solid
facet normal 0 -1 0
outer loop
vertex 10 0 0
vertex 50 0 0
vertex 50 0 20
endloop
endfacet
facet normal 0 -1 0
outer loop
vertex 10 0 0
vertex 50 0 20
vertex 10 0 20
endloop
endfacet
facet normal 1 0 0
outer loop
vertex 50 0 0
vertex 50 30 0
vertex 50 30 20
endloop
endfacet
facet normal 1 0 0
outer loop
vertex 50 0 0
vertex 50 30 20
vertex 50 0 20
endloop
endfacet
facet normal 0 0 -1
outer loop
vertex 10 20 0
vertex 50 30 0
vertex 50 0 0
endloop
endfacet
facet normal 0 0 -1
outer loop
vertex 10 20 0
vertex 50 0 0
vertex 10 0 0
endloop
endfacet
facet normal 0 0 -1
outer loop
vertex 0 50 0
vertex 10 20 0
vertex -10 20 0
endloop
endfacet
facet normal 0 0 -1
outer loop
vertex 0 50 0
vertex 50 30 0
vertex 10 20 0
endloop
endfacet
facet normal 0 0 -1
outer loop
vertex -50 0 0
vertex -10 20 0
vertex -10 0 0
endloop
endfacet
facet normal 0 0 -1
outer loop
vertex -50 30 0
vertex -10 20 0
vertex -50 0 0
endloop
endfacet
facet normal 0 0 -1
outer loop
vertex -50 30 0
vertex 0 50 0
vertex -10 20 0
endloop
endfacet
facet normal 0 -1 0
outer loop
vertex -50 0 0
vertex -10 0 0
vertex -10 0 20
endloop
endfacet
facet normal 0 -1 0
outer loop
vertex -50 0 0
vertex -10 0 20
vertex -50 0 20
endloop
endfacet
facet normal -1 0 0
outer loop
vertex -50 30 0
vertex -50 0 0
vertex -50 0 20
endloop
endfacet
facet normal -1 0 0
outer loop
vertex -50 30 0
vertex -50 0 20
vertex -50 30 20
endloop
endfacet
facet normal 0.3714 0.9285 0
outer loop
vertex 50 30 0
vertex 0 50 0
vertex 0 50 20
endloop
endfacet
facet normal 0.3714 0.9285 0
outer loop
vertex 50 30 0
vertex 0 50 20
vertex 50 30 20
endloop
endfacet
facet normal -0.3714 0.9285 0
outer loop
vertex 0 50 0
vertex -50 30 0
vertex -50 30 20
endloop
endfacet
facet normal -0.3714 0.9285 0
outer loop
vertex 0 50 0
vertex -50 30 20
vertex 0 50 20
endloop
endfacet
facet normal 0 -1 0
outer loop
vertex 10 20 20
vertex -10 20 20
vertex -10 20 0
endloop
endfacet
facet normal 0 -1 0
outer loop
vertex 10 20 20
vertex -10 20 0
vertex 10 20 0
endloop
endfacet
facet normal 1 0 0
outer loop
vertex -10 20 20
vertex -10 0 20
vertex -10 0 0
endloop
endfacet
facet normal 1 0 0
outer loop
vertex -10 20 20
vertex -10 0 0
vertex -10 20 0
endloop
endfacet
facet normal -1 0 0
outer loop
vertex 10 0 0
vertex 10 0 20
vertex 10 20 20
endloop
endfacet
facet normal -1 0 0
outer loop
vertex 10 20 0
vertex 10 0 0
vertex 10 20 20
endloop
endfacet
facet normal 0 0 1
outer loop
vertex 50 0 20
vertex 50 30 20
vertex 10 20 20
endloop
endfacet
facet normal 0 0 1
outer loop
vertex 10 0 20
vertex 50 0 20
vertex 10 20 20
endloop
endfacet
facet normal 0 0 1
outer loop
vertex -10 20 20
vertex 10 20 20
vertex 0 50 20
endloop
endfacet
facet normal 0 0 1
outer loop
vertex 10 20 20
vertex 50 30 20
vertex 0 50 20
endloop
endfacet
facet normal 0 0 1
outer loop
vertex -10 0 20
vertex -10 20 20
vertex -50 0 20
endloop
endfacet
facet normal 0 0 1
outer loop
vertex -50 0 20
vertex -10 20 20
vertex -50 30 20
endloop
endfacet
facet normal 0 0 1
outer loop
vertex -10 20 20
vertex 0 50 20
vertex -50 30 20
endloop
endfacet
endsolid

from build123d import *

# Parameters (mm, degrees)
BOSS_EXTRUDE1_DEPTH = 20
SKETCH2_W           = 20
SKETCH2_H           = 20
CUT_EXTRUDE1_DEPTH  = 74.484692283


with BuildPart() as part:
    # Sketch1 → Boss-Extrude1 (new body)
    with BuildSketch(Plane.XY):
        Polygon((50, 0), (-50, 0), (-50, 30), (0, 50), (50, 30), align=None)
    extrude(amount=BOSS_EXTRUDE1_DEPTH)

    # Sketch2 → Cut-Extrude1 (cut, through all)
    with BuildSketch(Plane.XY.offset(20)):
        with Locations((0, 10)):
            Rectangle(SKETCH2_W, SKETCH2_H)
    extrude(amount=-CUT_EXTRUDE1_DEPTH, mode=Mode.SUBTRACT)


solid = part.part
